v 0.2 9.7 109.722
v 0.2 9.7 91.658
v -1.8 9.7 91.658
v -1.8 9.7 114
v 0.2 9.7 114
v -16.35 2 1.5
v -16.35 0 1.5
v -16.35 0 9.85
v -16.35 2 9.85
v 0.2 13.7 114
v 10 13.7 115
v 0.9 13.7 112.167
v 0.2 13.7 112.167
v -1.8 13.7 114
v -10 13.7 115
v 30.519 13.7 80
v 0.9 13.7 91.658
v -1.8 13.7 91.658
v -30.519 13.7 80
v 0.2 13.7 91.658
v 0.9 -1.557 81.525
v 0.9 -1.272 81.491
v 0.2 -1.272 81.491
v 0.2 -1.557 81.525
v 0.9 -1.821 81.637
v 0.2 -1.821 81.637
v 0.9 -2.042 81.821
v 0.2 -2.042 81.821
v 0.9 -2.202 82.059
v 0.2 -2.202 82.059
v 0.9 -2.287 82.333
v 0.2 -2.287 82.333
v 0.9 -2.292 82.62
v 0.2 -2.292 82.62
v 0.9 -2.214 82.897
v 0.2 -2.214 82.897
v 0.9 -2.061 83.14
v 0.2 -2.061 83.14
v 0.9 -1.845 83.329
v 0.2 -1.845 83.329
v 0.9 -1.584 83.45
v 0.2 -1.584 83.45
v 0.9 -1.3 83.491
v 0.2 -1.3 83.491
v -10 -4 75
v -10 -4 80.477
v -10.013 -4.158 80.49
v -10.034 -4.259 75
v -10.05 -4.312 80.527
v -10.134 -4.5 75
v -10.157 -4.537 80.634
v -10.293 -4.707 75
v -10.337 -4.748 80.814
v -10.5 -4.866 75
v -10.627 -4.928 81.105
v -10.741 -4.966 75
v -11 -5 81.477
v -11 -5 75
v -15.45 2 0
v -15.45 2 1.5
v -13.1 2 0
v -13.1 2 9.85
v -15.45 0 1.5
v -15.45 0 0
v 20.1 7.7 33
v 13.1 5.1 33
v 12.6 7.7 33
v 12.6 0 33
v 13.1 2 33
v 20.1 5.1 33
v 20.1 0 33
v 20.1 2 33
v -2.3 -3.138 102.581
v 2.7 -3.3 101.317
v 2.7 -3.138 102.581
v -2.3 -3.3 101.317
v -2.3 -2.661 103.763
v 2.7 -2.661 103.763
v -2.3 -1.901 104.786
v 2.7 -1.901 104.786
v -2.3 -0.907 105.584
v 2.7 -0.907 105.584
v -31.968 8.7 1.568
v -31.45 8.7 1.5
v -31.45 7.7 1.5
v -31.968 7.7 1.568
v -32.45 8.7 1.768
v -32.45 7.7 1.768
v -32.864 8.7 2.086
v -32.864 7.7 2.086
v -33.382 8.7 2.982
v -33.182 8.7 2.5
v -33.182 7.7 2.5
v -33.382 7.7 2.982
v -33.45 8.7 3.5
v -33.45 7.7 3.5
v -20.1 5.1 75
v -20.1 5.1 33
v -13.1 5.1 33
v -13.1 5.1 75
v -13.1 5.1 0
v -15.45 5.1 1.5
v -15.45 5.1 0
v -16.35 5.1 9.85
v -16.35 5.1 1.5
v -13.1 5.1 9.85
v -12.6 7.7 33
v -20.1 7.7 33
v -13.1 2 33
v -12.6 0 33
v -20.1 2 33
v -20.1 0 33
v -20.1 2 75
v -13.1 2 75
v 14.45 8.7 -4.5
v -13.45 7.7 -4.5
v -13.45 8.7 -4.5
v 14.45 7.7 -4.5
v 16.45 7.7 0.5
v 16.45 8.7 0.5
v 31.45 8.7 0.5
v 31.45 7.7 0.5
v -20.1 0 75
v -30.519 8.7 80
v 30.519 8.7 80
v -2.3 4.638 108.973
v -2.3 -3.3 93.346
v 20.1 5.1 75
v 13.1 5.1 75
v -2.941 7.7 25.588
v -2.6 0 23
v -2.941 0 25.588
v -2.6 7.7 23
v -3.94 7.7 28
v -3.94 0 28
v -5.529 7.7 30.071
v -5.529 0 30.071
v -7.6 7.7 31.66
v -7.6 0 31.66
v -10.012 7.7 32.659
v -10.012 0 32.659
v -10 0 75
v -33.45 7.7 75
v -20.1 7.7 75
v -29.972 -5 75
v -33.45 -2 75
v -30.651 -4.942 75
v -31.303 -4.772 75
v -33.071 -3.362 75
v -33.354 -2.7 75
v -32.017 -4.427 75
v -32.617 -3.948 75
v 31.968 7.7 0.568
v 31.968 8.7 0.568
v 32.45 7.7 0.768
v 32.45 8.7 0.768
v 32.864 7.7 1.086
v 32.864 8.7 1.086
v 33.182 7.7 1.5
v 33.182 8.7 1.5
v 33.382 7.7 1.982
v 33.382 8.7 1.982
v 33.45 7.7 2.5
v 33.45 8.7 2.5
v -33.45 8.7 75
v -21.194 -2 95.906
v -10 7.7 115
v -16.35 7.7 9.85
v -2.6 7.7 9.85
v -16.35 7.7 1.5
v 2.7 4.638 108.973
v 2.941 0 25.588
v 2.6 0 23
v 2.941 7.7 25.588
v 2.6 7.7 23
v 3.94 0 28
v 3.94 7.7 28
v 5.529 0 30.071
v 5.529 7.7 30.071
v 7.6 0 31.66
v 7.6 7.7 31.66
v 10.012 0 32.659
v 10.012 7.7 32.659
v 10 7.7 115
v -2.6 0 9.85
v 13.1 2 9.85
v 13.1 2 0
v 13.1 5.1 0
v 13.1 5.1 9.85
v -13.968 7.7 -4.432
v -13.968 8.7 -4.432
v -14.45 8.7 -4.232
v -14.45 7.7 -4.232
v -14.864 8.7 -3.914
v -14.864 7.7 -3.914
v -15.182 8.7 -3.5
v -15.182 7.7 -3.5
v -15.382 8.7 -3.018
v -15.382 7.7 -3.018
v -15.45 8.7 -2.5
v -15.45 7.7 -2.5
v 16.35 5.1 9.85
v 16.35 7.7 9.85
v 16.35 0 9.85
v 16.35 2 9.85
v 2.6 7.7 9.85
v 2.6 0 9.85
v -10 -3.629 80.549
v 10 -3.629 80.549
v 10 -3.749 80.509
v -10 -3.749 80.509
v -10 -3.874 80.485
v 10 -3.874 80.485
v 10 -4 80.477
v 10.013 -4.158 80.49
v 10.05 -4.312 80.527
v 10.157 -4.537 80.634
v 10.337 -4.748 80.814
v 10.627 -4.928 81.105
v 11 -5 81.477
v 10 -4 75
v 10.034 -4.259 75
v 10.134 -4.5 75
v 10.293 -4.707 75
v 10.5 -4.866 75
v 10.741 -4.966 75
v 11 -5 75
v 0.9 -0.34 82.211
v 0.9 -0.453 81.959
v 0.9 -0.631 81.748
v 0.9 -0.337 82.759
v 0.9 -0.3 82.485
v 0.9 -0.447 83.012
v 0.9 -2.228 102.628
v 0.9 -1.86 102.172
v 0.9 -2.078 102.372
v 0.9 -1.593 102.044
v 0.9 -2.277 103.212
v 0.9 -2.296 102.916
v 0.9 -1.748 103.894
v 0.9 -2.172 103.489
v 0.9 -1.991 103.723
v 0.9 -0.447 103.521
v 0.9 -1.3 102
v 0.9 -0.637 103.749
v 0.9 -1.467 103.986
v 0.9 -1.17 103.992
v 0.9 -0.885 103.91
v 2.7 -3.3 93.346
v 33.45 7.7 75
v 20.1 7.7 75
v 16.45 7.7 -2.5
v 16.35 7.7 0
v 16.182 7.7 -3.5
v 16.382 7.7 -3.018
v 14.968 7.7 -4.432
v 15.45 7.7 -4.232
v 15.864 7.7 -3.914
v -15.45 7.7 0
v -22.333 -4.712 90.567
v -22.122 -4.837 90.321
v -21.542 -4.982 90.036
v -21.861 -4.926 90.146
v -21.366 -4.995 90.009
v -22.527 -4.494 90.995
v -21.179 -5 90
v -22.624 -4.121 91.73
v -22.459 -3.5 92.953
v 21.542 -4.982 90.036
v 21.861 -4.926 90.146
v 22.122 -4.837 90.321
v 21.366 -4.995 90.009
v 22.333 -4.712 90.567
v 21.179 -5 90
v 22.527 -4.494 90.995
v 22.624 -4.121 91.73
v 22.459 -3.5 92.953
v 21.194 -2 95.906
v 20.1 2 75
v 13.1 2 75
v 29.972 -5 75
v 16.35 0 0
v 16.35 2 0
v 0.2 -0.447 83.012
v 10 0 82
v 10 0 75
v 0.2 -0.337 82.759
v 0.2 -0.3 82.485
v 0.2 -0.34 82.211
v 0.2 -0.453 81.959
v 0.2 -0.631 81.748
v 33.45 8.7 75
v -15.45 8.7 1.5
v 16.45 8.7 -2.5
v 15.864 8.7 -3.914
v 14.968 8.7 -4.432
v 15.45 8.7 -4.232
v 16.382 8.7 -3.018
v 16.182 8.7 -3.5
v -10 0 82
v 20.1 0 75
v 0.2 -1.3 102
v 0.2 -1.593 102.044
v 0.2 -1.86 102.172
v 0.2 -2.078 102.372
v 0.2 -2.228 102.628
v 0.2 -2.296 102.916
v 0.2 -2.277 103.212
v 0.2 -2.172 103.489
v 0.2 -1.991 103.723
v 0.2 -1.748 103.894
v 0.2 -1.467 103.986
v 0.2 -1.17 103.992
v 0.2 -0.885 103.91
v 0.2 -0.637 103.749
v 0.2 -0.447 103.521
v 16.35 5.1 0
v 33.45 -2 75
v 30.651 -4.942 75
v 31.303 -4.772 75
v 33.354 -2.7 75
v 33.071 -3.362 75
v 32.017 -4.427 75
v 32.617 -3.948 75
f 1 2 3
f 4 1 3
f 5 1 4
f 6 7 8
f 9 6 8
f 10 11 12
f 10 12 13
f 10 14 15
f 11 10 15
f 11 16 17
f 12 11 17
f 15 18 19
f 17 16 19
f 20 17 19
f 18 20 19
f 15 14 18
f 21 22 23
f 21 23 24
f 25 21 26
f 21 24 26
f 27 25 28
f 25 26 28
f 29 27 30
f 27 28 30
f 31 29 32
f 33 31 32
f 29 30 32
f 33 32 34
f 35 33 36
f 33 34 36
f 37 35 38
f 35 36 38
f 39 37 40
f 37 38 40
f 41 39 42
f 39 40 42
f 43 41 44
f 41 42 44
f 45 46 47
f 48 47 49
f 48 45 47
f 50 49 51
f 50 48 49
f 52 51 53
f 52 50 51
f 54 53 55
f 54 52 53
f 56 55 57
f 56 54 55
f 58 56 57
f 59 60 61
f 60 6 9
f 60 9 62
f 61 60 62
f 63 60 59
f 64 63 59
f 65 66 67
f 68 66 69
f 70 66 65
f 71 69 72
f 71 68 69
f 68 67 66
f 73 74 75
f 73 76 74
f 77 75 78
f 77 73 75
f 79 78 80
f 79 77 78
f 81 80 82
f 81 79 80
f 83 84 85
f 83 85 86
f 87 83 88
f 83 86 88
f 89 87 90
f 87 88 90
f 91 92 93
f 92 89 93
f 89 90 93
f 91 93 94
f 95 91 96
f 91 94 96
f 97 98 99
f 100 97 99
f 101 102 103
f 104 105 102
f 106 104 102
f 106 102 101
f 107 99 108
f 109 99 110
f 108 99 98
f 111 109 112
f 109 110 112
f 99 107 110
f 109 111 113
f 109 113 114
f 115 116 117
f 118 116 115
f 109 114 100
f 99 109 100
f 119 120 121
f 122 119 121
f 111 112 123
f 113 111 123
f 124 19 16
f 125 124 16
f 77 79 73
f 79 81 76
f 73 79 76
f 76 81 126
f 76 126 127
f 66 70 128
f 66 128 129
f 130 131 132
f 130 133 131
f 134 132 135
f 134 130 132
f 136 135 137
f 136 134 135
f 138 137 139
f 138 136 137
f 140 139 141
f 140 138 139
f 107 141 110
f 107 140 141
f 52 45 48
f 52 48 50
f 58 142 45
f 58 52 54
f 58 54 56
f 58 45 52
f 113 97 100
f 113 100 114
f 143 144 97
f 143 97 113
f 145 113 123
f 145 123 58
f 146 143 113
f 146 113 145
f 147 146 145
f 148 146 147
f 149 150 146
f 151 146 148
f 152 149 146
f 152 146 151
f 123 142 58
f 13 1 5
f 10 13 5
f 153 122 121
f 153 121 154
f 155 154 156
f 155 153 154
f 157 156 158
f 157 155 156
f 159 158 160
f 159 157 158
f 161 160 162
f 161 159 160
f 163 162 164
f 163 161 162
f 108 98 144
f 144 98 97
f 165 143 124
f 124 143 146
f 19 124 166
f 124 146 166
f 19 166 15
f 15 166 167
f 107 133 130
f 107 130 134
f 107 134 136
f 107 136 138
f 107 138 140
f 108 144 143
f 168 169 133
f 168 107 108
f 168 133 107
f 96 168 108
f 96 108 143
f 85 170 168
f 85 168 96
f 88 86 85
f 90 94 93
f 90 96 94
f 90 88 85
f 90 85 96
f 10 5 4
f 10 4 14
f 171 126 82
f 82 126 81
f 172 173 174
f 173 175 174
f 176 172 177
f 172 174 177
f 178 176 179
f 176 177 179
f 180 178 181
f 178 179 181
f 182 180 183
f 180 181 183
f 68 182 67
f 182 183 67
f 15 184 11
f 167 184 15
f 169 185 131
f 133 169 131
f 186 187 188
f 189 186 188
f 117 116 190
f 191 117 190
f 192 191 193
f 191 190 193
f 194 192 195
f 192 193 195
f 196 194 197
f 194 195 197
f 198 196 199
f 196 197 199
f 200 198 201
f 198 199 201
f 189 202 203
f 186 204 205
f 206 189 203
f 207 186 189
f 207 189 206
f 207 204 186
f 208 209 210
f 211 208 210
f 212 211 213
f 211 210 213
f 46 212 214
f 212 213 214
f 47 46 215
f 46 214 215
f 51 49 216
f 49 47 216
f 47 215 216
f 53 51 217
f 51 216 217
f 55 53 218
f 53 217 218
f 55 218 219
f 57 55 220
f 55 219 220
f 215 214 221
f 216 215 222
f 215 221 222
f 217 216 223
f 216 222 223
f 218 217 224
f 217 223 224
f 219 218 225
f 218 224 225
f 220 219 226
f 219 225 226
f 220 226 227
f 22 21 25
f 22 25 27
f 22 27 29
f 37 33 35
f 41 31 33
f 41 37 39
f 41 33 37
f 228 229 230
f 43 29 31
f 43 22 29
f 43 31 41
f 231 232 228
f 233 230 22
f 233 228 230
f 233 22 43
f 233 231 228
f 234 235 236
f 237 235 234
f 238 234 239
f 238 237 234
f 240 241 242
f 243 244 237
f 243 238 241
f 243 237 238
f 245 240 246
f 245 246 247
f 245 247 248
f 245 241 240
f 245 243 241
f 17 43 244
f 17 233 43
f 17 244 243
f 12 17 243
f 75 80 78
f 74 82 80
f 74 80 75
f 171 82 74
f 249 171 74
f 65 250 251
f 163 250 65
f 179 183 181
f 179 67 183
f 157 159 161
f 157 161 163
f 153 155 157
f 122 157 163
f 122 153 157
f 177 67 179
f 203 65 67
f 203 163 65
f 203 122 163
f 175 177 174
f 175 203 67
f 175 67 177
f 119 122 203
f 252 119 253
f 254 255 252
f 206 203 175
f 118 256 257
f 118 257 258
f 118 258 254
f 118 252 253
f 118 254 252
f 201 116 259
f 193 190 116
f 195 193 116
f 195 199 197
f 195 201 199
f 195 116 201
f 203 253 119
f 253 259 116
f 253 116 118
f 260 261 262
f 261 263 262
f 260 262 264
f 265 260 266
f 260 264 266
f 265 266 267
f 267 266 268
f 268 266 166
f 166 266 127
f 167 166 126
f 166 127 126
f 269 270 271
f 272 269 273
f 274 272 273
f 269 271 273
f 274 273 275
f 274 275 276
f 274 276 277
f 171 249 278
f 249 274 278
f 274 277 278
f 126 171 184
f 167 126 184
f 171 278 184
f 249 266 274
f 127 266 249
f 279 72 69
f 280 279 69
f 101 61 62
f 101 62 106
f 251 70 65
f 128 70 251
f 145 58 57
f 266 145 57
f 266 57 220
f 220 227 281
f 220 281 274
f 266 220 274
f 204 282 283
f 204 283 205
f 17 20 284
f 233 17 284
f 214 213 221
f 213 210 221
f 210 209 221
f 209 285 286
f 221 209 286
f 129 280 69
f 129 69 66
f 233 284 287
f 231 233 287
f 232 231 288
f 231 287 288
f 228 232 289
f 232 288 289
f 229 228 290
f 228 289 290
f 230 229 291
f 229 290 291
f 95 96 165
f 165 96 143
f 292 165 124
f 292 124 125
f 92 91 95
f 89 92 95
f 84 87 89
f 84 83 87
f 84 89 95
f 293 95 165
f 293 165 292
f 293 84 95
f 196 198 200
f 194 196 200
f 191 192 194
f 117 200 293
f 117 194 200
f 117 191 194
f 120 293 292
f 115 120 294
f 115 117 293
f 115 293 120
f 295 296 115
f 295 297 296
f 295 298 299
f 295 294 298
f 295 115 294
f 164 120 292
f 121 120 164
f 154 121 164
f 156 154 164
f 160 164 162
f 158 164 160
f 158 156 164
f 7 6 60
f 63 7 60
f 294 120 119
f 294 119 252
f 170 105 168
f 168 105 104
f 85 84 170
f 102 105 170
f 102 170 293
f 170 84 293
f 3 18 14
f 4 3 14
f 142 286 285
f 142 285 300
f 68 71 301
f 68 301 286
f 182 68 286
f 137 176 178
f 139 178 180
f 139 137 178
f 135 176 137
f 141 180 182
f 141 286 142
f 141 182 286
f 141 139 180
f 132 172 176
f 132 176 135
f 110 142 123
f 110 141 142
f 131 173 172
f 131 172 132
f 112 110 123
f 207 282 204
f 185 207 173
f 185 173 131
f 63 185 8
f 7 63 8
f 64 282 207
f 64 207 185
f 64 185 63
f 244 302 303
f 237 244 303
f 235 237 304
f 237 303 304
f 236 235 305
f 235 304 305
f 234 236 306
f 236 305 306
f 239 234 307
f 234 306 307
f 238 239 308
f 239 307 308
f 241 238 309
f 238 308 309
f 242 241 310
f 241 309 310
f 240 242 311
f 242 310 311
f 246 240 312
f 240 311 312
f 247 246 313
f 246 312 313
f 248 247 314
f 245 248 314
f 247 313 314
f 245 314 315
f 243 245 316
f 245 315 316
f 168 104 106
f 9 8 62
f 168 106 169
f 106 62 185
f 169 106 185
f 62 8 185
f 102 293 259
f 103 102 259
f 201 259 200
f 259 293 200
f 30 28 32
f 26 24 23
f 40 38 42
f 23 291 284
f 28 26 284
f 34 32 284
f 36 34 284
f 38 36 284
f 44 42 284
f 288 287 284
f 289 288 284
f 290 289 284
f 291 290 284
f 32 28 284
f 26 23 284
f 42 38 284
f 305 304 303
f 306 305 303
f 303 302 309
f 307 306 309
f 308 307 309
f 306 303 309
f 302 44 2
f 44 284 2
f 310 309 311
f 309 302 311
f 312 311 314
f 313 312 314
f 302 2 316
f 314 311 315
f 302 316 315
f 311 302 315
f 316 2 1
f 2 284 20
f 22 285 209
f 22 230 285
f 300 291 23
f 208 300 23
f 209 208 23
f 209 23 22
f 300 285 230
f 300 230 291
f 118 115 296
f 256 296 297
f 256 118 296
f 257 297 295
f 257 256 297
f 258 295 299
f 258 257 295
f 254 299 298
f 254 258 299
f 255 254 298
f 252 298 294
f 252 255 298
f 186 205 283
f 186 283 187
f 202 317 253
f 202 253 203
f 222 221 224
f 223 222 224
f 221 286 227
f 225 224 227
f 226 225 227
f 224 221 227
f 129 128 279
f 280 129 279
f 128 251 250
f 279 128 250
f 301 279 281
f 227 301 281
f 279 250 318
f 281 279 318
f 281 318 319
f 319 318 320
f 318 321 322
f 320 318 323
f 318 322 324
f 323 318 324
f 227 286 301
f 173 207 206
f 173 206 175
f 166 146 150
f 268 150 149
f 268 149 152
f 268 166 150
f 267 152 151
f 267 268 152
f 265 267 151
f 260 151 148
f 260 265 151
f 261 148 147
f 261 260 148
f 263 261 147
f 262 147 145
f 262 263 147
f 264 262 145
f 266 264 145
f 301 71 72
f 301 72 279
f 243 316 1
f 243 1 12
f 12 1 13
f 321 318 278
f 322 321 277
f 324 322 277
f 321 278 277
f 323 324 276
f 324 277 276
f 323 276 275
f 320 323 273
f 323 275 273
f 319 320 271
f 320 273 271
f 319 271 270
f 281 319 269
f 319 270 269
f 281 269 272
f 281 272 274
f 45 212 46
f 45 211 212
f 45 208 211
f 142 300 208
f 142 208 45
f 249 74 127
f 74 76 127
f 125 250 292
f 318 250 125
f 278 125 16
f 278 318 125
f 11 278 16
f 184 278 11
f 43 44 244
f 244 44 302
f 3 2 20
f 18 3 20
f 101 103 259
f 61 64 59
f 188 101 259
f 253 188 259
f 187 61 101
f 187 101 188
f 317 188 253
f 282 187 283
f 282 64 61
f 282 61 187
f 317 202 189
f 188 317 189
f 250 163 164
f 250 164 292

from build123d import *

# Parameters (mm, degrees)
BOSS_EXTRUDE1_DEPTH     = 7.7
SKETCH2_W               = 7
SKETCH2_H               = 3.1
CUT_EXTRUDE1_DEPTH      = 79.027559234
FILLET1_R               = 10
BOSS_EXTRUDE2_DEPTH     = 6
BOSS_EXTRUDE4_REACH     = 122.547
CUT_EXTRUDE2_DEPTH      = 121.437504541
CUT_EXTRUDE2_DEPTH_BACK = 121.437504541
CUT_EXTRUDE3_DEPTH      = 10
FILLET3_R               = 1
FILLET5_R               = 3
CUT_EXTRUDE4_REACH      = 123.217
SKETCH8_W               = 17
SKETCH8_H               = 5
SKETCH8_W_2             = 19
SKETCH8_H_2             = 7
FILLET6_R               = 2
FILLET7_R               = 2
BOSS_EXTRUDE5_DEPTH     = 2.5
FILLET8_R               = 5
SKETCH11_R              = 1
CUT_EXTRUDE5_DEPTH      = 0.7
SKETCH13_W              = 22.342383579
SKETCH13_H              = 4
CUT_EXTRUDE6_DEPTH      = 2
SKETCH14_W              = 66.9
SKETCH14_H              = 84.5
CUT_EXTRUDE8_DEPTH      = 5


with BuildPart() as part:
    # Sketch1 → Boss-Extrude1 (new body)
    with BuildSketch(Plane(origin=(0, 0, 0), x_dir=(1, 0, 0), z_dir=(0, 1, 0))):
        Polygon((0, 0), (-16.35, 0), (-16.35, -9.85), (-2.6, -9.85), (-2.6, -33), (-20.1, -33), (-20.1, -75), (0, -75), align=None)
    extrude(amount=BOSS_EXTRUDE1_DEPTH)

    # Sketch2 → Cut-Extrude1 (cut, through all)
    with BuildSketch(Plane.XY.offset(75)):
        with Locations((-16.6, 3.55)):
            Rectangle(SKETCH2_W, SKETCH2_H)
    extrude(amount=-CUT_EXTRUDE1_DEPTH, mode=Mode.SUBTRACT)

    # Fillet1
    fillet1_edges = [part.edges().sort_by_distance(p)[0] for p in [
        (-2.6, 3.85, 33),
    ]]
    fillet(fillet1_edges, radius=FILLET1_R)

    # Sketch3 → Boss-Extrude2 (add)
    with BuildSketch(Plane(origin=(0, 7.7, 0), x_dir=(1, 0, 0), z_dir=(0, 1, 0))):
        Polygon((0, 4.5), (-33.45, 4.5), (-33.45, -75), (-10, -115), (0, -115), align=None)
    extrude(amount=BOSS_EXTRUDE2_DEPTH)

    # Boss-Extrude4: up to this face of the body (flat: up to its plane)
    boss_extrude4_end = Plane(part.part.faces().sort_by_distance((0, 7.644090382, 47.331402086))[0])
    # Sketch5 → Boss-Extrude4 (add, up to the picked face)
    with BuildSketch(Plane.ZY.offset(33.45), mode=Mode.PRIVATE) as boss_extrude4_sk1:
        Polygon((75, 7.7), (75, -5), (90, -5), (115, 7.7), align=None)
    boss_extrude4_tool1 = split(extrude(boss_extrude4_sk1.sketch, amount=-BOSS_EXTRUDE4_REACH, mode=Mode.PRIVATE), bisect_by=boss_extrude4_end, keep=Keep.BOTH, mode=Mode.PRIVATE)
    add(boss_extrude4_tool1.solids().sort_by(Axis((-33.45, 2.312121, 89.69697), (1, 0, 0)))[0])

    # Sketch6 → Cut-Extrude2 (cut, two sides: drawn at the far end of the back side and taken through both)
    with BuildSketch(Plane(origin=(0, 7.7, 0), x_dir=(1, 0, 0), z_dir=(0, 1, 0)).offset(-CUT_EXTRUDE2_DEPTH_BACK)):
        Polygon((-33.45, -75), (-10, -115), (-33.45, -115), align=None)
    extrude(amount=CUT_EXTRUDE2_DEPTH + CUT_EXTRUDE2_DEPTH_BACK, mode=Mode.SUBTRACT)

    # Sketch7 → Cut-Extrude3 (cut)
    with BuildSketch(Plane(origin=(0, 0, 0), x_dir=(0, 0, -1), z_dir=(1, 0, 0))):
        Polygon((-75, 0), (-82, 0), (-80, -5), (-75, -5), align=None)
    extrude(amount=-CUT_EXTRUDE3_DEPTH, mode=Mode.SUBTRACT)

    # Fillet3
    fillet3_edges = [part.edges().sort_by_distance(p)[0] for p in [
        (-10, -5, 77.5),
        (-5, -5, 80),
    ]]
    fillet(fillet3_edges, radius=FILLET3_R)

    # Mirror1: part across plane


with BuildPart() as part_1:
    add(part.part)
    add(part.part.mirror(Plane(origin=(0, 7.7, 75), x_dir=(0, 0, 1), z_dir=(-1, 0, 0))))

    # Fillet5
    fillet5_edges = [part_1.edges().sort_by_distance(p)[0] for p in [
        (-29.053125, -5, 82.5),
        (29.053125, -5, 82.5),
    ]]
    fillet(fillet5_edges, radius=FILLET5_R)

    # Cut-Extrude4: up to this face of the body (flat: up to its plane)
    cut_extrude4_end = Plane(part_1.part.faces().sort_by_distance((0, 0, 46.525100135))[0])
    # Sketch8 → Cut-Extrude4 (cut, up to the picked face)
    with BuildSketch(Plane(origin=(0, 13.7, 0), x_dir=(1, 0, 0), z_dir=(0, 1, 0)), mode=Mode.PRIVATE) as cut_extrude4_sk1:
        with Locations((24.95, 2)):
            Rectangle(SKETCH8_W, SKETCH8_H)
    cut_extrude4_tool1 = split(extrude(cut_extrude4_sk1.sketch, amount=-CUT_EXTRUDE4_REACH, mode=Mode.PRIVATE), bisect_by=cut_extrude4_end, keep=Keep.BOTH, mode=Mode.PRIVATE)
    # Sketch8 → Cut-Extrude4 (cut, up to the picked face)
    with BuildSketch(Plane(origin=(0, 13.7, 0), x_dir=(1, 0, 0), z_dir=(0, 1, 0)), mode=Mode.PRIVATE) as cut_extrude4_sk2:
        with Locations((-24.95, 2)):
            Rectangle(SKETCH8_W_2, SKETCH8_H_2)
    cut_extrude4_tool2 = split(extrude(cut_extrude4_sk2.sketch, amount=-CUT_EXTRUDE4_REACH, mode=Mode.PRIVATE), bisect_by=cut_extrude4_end, keep=Keep.BOTH, mode=Mode.PRIVATE)
    add(cut_extrude4_tool1.solids().sort_by(Axis((24.95, 13.7, -2), (0, -1, 0)))[0], mode=Mode.SUBTRACT)
    add(cut_extrude4_tool2.solids().sort_by(Axis((-24.95, 13.7, -2), (0, -1, 0)))[0], mode=Mode.SUBTRACT)

    # Fillet6
    fillet6_edges = [part_1.edges().sort_by_distance(p)[0] for p in [
        (-15.45, 10.7, -4.5),
        (-33.45, 10.7, 1.5),
    ]]
    fillet(fillet6_edges, radius=FILLET6_R)

    # Fillet7
    fillet7_edges = [part_1.edges().sort_by_distance(p)[0] for p in [
        (33.45, 10.7, 0.5),
        (16.45, 10.7, -4.5),
    ]]
    fillet(fillet7_edges, radius=FILLET7_R)

    # Sketch12 → Boss-Extrude5 (add, symmetric)
    with BuildSketch(Plane.ZY.offset(-0.2)):
        Polygon((93.346456693, -3.3), (108.972772013, 4.638168182), (104.121669234, -3.3), align=None)
    extrude(amount=BOSS_EXTRUDE5_DEPTH, both=True)

    # Fillet8
    fillet8_edges = [part_1.edges().sort_by_distance(p)[0] for p in [
        (0.2, -3.3, 104.121669234),
    ]]
    fillet(fillet8_edges, radius=FILLET8_R)

    # Sketch11 → Cut-Extrude5 (cut)
    with BuildSketch(Plane.ZY.offset(-0.2)):
        with Locations((82.490949754, -1.3)):
            Circle(SKETCH11_R)
        with Locations((103, -1.3)):
            Circle(SKETCH11_R)
        Polygon((82.490949754, -1.3), (103, -1.3), (114, 16.7), (93.490949754, 16.7), align=None)
        with BuildLine():
            Line((83.490949754, -1.3), (82.490949754, -1.3))
            Line((82.490949754, -1.3), (83.012399764, -0.446718166))
            ThreePointArc((83.012399764, -0.446718166), (81.618754246, -1.789157434), (83.490949754, -1.3))
        make_face()
        with BuildLine():
            Line((83.012399764, -0.446718166), (82.490949754, -1.3))
            Line((82.490949754, -1.3), (83.490949754, -1.3))
            ThreePointArc((83.490949754, -1.3), (83.363145263, -0.810842566), (83.012399764, -0.446718166))
        make_face()
        with BuildLine():
            ThreePointArc((103.521450009, -0.446718166), (102.510842566, -0.427804492), (102, -1.3))
            Line((102, -1.3), (103, -1.3))
            Line((103, -1.3), (103.521450009, -0.446718166))
        make_face()
        with BuildLine():
            Line((103, -1.3), (102, -1.3))
            ThreePointArc((102, -1.3), (103, -2.3), (104, -1.3))
            ThreePointArc((104, -1.3), (103.872195508, -0.810842566), (103.521450009, -0.446718166))
            Line((103.521450009, -0.446718166), (103, -1.3))
        make_face()
    extrude(amount=-CUT_EXTRUDE5_DEPTH, mode=Mode.SUBTRACT)

    # Sketch13 → Cut-Extrude6 (cut)
    with BuildSketch(Plane.ZY.offset(-0.2)):
        with Locations((102.828808211, 11.7)):
            Rectangle(SKETCH13_W, SKETCH13_H)
    extrude(amount=CUT_EXTRUDE6_DEPTH, mode=Mode.SUBTRACT)

    # Sketch14 → Cut-Extrude8 (cut)
    with BuildSketch(Plane(origin=(0, 13.7, 0), x_dir=(1, 0, 0), z_dir=(0, 1, 0))):
        with Locations((0, -37.75)):
            Rectangle(SKETCH14_W, SKETCH14_H)
    extrude(amount=-CUT_EXTRUDE8_DEPTH, mode=Mode.SUBTRACT)


solid = part_1.part
